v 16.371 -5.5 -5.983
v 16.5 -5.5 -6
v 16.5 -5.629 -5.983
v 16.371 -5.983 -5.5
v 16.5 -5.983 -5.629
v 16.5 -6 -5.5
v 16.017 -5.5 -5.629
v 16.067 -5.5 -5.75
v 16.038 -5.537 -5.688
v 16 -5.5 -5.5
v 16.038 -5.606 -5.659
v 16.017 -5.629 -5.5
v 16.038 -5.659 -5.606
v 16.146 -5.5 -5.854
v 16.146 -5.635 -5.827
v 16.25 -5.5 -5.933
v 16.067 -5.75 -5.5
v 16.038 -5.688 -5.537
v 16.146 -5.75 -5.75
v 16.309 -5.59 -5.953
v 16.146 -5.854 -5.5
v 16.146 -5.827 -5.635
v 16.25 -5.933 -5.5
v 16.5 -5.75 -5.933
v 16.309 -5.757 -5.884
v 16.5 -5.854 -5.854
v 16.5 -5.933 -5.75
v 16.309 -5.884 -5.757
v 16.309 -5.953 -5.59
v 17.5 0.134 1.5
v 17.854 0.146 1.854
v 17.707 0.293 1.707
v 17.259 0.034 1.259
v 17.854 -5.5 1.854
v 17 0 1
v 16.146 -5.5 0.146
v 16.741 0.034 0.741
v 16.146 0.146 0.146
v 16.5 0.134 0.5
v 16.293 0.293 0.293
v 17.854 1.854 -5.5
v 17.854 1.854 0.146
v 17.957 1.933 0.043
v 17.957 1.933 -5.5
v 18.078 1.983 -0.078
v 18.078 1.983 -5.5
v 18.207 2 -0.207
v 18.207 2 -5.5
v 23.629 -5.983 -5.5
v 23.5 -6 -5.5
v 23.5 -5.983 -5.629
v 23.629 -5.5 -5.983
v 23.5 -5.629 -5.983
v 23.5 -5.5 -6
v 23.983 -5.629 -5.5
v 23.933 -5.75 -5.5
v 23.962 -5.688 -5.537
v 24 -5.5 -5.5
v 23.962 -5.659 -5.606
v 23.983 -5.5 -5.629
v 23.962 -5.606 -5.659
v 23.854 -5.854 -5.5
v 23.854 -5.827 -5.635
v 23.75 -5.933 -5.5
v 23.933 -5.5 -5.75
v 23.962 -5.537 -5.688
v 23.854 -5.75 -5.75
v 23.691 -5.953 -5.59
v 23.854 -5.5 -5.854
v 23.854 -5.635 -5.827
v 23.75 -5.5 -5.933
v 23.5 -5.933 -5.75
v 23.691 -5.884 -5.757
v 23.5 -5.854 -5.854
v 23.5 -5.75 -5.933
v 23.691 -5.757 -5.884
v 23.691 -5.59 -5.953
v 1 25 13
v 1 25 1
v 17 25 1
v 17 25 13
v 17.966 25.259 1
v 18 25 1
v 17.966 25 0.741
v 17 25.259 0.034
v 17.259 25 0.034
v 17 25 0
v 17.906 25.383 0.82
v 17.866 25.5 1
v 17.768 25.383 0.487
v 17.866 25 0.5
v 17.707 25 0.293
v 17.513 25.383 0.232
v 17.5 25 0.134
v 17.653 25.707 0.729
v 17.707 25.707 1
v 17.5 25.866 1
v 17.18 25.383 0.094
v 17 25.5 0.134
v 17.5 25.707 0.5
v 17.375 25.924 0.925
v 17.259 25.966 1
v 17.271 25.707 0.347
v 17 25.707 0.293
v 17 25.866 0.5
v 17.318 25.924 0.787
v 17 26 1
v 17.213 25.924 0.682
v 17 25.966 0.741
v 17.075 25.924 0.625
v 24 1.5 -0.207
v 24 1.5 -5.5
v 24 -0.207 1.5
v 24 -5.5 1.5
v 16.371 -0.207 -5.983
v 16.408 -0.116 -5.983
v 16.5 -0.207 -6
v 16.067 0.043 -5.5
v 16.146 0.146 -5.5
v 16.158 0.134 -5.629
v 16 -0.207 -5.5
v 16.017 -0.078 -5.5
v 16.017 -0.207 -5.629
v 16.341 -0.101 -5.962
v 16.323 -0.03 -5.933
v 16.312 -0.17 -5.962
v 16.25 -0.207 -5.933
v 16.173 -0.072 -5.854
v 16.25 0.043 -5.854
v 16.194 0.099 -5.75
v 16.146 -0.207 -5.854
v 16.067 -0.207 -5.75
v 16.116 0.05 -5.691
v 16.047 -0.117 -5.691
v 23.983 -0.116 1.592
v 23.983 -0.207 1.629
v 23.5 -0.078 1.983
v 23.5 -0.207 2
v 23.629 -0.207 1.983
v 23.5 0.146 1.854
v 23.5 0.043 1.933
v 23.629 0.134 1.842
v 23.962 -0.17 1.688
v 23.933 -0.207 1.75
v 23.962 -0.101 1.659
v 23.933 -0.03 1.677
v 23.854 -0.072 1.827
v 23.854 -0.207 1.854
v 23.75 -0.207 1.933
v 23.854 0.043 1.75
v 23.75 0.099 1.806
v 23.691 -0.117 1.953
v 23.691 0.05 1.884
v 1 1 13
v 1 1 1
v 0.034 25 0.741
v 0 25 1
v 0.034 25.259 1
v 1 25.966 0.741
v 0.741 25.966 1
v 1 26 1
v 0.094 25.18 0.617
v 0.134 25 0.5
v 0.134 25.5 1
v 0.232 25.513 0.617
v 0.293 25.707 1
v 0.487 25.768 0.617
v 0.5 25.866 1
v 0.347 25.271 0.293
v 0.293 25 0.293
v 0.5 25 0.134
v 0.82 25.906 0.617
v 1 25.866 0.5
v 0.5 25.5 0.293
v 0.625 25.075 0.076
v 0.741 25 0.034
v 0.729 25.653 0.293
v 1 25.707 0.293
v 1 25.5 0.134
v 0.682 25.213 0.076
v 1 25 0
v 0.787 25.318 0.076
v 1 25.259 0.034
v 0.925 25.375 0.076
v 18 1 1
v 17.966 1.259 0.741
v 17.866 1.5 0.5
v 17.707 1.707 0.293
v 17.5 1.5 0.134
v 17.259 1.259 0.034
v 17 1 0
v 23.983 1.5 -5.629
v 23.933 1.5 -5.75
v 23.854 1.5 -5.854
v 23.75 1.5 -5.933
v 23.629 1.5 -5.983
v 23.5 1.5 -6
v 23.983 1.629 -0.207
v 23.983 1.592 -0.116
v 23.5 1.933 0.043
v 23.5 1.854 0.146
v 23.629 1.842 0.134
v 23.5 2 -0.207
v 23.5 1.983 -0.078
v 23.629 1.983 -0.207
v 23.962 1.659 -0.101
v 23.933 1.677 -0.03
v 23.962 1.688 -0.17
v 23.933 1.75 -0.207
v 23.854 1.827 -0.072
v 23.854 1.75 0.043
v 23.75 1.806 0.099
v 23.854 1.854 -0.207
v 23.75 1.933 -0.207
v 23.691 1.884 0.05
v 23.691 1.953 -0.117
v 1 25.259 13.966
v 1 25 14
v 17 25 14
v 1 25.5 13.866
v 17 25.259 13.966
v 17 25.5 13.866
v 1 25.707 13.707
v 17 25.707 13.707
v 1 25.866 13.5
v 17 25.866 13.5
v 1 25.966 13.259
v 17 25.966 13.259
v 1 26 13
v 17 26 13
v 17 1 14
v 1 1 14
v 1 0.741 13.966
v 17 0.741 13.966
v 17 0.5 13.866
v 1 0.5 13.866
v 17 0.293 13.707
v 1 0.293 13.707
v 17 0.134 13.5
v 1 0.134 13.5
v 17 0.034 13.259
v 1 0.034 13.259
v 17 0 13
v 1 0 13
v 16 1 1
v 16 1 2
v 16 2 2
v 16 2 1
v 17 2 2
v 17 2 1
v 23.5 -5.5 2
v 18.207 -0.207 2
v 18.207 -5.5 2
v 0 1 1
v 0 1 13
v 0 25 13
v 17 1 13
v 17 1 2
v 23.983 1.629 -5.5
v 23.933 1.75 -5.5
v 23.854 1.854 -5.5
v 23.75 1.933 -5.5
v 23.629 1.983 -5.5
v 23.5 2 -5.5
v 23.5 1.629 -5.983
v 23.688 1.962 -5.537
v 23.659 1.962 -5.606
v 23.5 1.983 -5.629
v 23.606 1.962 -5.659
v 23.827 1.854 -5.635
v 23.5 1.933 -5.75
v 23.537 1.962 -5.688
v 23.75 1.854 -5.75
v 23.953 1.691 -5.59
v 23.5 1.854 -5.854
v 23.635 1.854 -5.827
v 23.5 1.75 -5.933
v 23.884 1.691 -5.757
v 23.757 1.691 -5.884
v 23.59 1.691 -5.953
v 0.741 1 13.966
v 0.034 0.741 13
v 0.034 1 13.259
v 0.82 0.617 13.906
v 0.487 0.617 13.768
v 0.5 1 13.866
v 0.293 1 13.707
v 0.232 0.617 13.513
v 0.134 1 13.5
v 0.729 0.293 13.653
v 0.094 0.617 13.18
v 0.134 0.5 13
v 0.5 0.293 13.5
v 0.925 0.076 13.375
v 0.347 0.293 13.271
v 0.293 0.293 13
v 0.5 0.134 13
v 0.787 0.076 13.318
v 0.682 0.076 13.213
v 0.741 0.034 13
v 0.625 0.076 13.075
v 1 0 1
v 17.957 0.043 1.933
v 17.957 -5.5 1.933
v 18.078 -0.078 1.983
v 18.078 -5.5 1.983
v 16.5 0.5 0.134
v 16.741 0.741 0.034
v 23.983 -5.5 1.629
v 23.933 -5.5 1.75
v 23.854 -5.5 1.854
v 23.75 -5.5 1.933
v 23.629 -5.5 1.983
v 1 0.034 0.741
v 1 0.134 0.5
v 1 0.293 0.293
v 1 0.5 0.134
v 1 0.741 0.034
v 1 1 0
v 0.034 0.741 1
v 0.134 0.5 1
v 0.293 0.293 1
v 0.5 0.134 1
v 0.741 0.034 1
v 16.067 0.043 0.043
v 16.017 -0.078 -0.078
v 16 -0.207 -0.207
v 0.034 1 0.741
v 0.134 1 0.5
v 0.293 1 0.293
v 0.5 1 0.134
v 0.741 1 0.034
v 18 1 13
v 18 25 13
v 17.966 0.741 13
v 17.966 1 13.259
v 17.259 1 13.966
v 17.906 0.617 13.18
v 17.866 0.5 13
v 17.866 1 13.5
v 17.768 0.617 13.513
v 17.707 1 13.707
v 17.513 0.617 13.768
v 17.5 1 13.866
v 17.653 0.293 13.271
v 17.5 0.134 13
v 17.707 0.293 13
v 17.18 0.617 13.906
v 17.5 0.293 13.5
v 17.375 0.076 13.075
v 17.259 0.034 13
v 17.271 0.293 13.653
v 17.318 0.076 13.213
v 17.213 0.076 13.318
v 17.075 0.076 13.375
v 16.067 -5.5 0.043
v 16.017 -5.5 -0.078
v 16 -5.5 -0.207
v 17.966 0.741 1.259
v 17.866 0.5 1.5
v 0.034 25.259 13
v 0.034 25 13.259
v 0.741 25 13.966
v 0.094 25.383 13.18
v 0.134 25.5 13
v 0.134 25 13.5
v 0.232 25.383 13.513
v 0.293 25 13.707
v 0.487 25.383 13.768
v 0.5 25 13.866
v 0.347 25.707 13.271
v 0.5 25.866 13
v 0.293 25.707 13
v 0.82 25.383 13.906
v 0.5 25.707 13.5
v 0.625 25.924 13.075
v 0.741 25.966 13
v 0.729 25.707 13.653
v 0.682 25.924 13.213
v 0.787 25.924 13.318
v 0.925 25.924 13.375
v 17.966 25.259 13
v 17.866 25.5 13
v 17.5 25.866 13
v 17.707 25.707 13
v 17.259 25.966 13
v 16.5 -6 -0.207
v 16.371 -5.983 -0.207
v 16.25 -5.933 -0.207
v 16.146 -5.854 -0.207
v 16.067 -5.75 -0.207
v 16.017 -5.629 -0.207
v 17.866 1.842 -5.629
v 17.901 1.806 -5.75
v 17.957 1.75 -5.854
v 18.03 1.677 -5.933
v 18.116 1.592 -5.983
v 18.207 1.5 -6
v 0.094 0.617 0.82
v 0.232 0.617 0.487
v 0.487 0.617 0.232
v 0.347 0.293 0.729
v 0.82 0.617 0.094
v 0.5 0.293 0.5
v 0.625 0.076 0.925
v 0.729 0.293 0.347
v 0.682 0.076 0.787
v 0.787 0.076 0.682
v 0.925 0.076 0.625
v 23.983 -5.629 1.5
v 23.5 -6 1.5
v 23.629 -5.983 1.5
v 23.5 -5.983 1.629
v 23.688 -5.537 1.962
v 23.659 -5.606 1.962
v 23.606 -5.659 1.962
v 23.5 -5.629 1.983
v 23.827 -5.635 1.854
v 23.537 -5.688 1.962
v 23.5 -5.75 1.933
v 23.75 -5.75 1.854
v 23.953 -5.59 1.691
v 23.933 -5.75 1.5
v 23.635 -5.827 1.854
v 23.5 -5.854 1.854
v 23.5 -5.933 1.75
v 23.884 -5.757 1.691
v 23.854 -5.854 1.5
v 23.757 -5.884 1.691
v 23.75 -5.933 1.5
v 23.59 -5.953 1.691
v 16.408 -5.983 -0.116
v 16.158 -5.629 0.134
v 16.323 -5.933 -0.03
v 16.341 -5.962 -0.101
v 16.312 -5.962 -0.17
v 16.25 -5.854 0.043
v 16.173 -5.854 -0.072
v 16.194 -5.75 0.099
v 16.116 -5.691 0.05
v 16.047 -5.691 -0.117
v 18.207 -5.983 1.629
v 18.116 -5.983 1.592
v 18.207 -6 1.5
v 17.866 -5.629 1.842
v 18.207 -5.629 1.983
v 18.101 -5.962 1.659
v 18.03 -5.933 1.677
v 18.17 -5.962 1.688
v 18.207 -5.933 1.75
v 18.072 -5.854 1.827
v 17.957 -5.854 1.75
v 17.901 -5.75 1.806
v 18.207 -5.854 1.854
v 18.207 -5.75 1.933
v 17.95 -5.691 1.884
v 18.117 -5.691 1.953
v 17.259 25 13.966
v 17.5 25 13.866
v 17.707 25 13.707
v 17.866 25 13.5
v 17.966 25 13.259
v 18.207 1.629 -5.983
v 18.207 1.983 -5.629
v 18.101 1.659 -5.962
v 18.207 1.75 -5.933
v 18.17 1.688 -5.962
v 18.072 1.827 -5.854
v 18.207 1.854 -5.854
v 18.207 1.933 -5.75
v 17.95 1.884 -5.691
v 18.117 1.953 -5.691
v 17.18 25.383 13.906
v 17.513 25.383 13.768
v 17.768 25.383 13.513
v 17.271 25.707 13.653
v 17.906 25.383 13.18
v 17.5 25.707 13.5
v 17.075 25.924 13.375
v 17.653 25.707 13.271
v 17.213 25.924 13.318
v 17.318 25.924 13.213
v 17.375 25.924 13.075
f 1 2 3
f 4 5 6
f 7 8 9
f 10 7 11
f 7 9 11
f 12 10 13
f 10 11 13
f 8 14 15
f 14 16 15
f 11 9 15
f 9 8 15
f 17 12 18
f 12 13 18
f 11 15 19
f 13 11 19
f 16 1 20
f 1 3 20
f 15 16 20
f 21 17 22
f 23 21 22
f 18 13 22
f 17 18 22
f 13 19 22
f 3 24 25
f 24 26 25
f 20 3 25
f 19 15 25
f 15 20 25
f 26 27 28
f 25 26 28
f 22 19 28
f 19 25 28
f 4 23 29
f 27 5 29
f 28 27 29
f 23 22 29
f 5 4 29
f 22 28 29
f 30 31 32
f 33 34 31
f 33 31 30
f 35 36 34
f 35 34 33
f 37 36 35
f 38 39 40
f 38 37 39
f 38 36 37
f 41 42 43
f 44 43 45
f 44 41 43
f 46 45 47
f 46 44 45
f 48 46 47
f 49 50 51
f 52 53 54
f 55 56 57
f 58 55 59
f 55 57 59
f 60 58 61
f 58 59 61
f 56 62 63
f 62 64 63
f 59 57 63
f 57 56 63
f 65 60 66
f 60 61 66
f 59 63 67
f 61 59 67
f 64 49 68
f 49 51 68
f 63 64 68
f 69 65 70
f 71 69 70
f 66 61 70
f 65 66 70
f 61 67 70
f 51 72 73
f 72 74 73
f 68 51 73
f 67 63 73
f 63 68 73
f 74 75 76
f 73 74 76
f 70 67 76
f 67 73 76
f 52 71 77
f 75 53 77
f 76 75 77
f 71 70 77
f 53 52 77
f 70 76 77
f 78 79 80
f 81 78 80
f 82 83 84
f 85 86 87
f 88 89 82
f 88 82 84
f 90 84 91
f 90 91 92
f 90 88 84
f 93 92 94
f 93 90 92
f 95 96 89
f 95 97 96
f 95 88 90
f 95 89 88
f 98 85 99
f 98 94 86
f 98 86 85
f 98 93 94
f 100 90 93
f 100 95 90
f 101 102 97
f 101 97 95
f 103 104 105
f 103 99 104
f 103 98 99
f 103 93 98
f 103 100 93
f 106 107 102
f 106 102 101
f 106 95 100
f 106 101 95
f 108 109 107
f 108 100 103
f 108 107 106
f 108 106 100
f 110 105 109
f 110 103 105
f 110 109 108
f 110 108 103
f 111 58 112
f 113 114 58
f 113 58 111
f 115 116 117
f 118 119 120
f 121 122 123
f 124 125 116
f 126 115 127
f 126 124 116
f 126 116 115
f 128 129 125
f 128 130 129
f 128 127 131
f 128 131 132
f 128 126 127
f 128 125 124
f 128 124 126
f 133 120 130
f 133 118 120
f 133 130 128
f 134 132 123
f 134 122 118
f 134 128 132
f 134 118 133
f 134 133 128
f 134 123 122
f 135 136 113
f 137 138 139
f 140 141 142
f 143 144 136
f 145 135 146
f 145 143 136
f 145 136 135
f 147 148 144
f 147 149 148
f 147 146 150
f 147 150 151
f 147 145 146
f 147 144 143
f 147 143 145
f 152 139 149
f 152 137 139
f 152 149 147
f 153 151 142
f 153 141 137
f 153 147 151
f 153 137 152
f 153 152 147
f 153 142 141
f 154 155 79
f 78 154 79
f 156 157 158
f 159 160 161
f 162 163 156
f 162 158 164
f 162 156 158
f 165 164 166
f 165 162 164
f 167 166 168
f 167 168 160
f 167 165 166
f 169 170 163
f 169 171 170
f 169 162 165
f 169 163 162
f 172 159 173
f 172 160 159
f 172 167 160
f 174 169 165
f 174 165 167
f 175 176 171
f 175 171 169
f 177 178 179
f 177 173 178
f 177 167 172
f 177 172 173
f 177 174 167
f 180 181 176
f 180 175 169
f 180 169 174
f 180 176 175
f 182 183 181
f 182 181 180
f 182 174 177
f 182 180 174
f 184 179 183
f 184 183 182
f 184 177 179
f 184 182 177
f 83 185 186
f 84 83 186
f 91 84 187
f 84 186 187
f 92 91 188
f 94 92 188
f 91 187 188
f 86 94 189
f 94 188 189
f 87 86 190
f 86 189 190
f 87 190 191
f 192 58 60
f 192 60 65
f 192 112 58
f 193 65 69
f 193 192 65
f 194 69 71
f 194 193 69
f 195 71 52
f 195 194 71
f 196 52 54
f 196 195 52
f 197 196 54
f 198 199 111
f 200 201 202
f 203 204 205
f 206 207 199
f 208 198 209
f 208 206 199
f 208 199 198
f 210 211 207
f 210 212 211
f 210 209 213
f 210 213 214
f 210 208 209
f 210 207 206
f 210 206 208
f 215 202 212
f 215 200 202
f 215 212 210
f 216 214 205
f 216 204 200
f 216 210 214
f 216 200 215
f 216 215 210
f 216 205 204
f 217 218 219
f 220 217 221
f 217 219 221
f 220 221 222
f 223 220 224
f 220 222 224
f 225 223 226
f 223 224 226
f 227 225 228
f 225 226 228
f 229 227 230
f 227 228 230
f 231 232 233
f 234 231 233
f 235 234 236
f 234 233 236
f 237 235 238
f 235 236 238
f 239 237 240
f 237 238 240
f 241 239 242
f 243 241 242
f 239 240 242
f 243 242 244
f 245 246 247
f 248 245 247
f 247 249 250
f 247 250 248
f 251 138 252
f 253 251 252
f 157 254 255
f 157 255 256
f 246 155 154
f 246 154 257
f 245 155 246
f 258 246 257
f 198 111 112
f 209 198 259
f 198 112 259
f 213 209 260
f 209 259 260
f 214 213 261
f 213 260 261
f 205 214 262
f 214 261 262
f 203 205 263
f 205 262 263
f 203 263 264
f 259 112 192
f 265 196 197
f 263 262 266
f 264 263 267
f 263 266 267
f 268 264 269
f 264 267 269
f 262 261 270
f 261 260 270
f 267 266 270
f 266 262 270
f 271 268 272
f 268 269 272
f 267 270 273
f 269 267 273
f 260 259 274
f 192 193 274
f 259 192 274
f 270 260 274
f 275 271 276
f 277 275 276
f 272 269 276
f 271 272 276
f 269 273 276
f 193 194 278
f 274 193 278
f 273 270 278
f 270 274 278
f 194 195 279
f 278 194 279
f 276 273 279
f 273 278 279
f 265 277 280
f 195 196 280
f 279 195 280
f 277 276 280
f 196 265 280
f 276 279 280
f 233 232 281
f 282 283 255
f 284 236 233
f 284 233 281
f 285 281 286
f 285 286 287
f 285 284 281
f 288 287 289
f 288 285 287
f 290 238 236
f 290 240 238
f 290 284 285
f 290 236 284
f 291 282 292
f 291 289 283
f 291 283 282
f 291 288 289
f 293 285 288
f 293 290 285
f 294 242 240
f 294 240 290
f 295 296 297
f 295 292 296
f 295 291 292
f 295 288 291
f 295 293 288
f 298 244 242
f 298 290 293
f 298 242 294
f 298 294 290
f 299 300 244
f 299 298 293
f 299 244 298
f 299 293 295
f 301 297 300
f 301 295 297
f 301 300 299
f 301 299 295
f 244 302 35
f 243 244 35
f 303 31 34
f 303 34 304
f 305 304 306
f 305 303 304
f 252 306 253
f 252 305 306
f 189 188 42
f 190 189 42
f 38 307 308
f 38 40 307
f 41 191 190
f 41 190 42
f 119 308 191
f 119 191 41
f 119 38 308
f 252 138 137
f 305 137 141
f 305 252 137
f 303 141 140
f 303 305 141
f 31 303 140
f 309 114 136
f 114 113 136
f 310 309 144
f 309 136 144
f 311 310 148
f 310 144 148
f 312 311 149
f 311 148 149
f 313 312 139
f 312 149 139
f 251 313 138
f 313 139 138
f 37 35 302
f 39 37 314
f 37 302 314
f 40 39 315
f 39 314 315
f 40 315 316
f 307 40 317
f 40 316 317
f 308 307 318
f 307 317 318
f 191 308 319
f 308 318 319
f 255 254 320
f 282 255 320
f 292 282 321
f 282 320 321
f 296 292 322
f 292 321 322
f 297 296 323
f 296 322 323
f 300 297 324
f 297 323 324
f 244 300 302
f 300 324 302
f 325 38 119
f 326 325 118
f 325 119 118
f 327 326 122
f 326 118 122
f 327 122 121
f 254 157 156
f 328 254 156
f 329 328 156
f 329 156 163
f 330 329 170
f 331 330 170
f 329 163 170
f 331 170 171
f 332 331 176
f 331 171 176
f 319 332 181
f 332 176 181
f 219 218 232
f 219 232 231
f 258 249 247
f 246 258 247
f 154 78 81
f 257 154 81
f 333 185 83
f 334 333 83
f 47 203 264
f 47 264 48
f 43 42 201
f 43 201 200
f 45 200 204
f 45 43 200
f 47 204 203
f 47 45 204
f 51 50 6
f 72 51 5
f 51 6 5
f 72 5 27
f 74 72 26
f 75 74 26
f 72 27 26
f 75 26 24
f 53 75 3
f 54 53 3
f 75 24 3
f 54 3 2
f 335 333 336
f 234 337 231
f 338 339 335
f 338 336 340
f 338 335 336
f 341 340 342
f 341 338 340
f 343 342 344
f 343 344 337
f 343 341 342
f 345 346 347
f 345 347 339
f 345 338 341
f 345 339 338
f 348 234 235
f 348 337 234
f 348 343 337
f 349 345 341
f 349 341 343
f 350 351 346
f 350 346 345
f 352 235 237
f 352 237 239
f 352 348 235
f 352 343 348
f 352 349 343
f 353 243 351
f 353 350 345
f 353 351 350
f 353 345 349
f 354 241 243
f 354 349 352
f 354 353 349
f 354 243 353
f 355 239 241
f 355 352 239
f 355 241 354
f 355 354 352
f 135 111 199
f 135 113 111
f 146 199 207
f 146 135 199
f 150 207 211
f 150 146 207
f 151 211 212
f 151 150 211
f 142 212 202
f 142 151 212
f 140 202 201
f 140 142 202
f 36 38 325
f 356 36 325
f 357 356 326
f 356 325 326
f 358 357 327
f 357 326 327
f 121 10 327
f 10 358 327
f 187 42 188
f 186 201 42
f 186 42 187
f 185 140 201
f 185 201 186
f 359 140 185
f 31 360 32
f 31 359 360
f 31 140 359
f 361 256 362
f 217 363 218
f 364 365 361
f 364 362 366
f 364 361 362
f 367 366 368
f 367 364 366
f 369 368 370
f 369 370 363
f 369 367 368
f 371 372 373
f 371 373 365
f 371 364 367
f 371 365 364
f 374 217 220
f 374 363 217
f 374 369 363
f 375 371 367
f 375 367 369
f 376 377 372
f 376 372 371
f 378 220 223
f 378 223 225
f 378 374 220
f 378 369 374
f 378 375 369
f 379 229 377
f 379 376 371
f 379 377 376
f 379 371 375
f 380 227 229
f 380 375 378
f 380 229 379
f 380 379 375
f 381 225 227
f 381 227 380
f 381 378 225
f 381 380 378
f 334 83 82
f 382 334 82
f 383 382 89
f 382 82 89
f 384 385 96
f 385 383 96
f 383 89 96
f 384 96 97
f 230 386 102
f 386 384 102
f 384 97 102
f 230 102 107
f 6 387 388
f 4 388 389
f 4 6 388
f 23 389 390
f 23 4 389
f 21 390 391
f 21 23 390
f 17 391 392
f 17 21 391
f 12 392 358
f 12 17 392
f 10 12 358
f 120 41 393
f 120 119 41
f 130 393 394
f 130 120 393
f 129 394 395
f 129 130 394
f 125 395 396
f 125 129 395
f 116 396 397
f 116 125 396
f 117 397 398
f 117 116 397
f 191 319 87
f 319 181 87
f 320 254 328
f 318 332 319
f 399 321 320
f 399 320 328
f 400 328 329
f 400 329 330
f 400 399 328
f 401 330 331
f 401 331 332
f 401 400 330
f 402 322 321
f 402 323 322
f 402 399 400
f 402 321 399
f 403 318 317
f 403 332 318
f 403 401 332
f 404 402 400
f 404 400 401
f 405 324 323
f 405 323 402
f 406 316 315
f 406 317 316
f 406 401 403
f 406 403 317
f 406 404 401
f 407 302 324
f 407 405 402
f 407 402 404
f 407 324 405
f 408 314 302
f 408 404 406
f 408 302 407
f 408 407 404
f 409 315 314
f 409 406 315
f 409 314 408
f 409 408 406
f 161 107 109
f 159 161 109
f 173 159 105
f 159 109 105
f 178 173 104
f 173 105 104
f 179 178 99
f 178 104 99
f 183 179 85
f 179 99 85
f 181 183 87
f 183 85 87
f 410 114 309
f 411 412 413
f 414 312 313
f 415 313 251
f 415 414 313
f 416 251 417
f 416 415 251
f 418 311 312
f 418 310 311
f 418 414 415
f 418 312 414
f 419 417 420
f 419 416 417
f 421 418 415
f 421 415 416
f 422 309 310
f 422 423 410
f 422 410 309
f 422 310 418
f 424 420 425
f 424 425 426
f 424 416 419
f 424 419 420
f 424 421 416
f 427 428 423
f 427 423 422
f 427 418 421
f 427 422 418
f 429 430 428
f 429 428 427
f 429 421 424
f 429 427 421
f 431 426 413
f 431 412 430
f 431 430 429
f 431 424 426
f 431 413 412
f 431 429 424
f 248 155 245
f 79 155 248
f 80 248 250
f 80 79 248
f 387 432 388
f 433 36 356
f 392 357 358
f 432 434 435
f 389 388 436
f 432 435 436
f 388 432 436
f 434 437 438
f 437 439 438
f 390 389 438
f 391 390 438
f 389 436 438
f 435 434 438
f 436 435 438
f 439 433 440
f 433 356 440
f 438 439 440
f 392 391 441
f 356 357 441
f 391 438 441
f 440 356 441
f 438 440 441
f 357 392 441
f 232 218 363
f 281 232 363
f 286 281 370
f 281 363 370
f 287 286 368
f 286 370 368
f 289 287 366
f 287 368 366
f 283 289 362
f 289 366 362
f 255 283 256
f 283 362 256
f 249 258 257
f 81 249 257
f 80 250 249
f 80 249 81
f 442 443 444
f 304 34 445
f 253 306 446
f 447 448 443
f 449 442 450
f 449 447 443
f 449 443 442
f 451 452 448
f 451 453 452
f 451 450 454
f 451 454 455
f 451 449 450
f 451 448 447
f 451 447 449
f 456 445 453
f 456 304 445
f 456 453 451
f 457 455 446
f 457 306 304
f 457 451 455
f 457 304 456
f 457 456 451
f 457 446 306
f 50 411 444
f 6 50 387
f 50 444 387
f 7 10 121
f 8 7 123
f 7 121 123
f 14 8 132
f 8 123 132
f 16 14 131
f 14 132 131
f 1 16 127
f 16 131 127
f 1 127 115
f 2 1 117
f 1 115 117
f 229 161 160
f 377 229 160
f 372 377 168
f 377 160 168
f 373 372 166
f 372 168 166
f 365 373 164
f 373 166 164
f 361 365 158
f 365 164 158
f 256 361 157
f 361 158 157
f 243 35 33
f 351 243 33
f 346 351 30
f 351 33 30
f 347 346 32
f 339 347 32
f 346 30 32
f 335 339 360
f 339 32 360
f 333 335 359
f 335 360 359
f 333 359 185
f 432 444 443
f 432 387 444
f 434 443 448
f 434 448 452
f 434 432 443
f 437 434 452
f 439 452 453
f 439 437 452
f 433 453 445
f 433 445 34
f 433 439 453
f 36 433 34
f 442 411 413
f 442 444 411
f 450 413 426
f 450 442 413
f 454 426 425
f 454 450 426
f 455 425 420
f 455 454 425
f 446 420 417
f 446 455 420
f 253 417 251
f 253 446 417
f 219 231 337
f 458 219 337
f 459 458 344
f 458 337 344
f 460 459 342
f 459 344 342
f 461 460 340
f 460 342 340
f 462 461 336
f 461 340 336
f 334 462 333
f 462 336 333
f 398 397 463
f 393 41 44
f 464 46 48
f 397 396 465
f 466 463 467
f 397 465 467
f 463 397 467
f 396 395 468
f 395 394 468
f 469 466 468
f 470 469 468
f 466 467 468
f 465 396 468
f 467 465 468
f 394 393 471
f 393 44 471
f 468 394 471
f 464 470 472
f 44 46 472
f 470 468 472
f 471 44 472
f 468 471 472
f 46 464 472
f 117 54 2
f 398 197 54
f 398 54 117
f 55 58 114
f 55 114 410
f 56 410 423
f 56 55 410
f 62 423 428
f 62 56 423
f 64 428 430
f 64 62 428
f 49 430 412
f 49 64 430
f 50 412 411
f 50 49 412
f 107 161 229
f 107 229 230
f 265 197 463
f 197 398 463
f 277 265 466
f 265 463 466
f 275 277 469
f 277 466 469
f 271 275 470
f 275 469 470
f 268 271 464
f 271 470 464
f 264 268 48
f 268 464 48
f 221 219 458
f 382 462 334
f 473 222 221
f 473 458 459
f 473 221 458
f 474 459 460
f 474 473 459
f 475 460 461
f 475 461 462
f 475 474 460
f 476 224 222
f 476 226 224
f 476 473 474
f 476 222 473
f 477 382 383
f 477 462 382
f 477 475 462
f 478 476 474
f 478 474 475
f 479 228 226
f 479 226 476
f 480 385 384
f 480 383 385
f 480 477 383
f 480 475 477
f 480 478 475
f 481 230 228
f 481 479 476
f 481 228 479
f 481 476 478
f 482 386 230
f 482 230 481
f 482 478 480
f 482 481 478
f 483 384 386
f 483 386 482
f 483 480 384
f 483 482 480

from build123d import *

# Parameters (mm, degrees)
SKETCH1_W                = 18
SKETCH1_H                = 26
BOSS_EXTRUDE1_DEPTH      = 14
SHELL1_T                 = 1
BOSS_EXTRUDE3_DEPTH      = 6
BOSS_EXTRUDE3_DEPTH_BACK = 2
SKETCH2_W                = 8
SKETCH2_H                = 8
CHAMFER2_SIZE            = 2
FILLET1_R                = 1
FILLET2_R                = 0.5


with BuildPart() as part:
    # Sketch1 → Boss-Extrude1 (new body)
    with BuildSketch(Plane.XY):
        with Locations((9, 13)):
            Rectangle(SKETCH1_W, SKETCH1_H)
    extrude(amount=BOSS_EXTRUDE1_DEPTH)

    # Shell1 (no face opened: a closed hollow body)
    add(offset(amount=-SHELL1_T, mode=Mode.PRIVATE), mode=Mode.SUBTRACT)

    # Sketch2 → Boss-Extrude3 (add, two sides: drawn at the far end of the back side and taken through both)
    with BuildSketch(Plane(origin=(0, 0, 0), x_dir=(-1, 0, 0), z_dir=(0, 0, -1)).offset(-BOSS_EXTRUDE3_DEPTH_BACK)):
        with Locations((-20, -2)):
            Rectangle(SKETCH2_W, SKETCH2_H)
    extrude(amount=BOSS_EXTRUDE3_DEPTH + BOSS_EXTRUDE3_DEPTH_BACK)

    # Chamfer2
    chamfer2_edges = [part.edges().sort_by_distance(p)[0] for p in [
        (16, -3, 2),
        (16, 2, -3),
        (21, 2, 2),
    ]]
    chamfer(chamfer2_edges, length=CHAMFER2_SIZE)

    # Fillet1
    # the kernel refuses this fillet: 1 mm, written as the material it takes off along each edge
    with BuildSketch(Plane(origin=(1, 25, 1), x_dir=(0, 1, 0), z_dir=(0, 0, -1))) as fillet1_piece_1_section:
        Polygon((0, 0), (FILLET1_R, 0), (FILLET1_R, -FILLET1_R), (0, -FILLET1_R), align=None)
    fillet1_piece_1 = extrude(amount=FILLET1_R, mode=Mode.PRIVATE)
    fillet1_piece_1 = fillet1_piece_1 - Plane(origin=(1, 25, 1), x_dir=(0.7071067811865475, -0.7071067811865477, 0), z_dir=(0, 0, -1)) * Sphere(FILLET1_R, mode=Mode.PRIVATE)
    add(fillet1_piece_1, mode=Mode.SUBTRACT)
    with BuildSketch(Plane(origin=(1, 1, 1), x_dir=(0, 0, -1), z_dir=(0, -1, 0))) as fillet1_piece_2_section:
        Polygon((0, 0), (FILLET1_R, 0), (FILLET1_R, -FILLET1_R), (0, -FILLET1_R), align=None)
    fillet1_piece_2 = extrude(amount=FILLET1_R, mode=Mode.PRIVATE)
    fillet1_piece_2 = fillet1_piece_2 - Plane(origin=(1, 1, 1), x_dir=(0.7071067811865475, 0, 0.7071067811865475), z_dir=(0, -1, 0)) * Sphere(FILLET1_R, mode=Mode.PRIVATE)
    add(fillet1_piece_2, mode=Mode.SUBTRACT)
    with BuildSketch(Plane(origin=(17, 25, 1), x_dir=(0, 0, -1), z_dir=(0, 1, 0))) as fillet1_piece_3_section:
        Polygon((0, 0), (FILLET1_R, 0), (FILLET1_R, -FILLET1_R), (0, -FILLET1_R), align=None)
    fillet1_piece_3 = extrude(amount=FILLET1_R, mode=Mode.PRIVATE)
    fillet1_piece_3 = fillet1_piece_3 - Plane(origin=(17, 25, 1), x_dir=(-0.7071067811865475, 0, 0.7071067811865475), z_dir=(0, 1, 0)) * Sphere(FILLET1_R, mode=Mode.PRIVATE)
    add(fillet1_piece_3, mode=Mode.SUBTRACT)
    with BuildSketch(Plane(origin=(1, 1, 13), x_dir=(-1, 0, 0), z_dir=(0, -1, 0))) as fillet1_piece_4_section:
        Polygon((0, 0), (FILLET1_R, 0), (FILLET1_R, -FILLET1_R), (0, -FILLET1_R), align=None)
    fillet1_piece_4 = extrude(amount=FILLET1_R, mode=Mode.PRIVATE)
    fillet1_piece_4 = fillet1_piece_4 - Plane(origin=(1, 1, 13), x_dir=(0.7071067811865475, 0, -0.7071067811865475), z_dir=(0, -1, 0)) * Sphere(FILLET1_R, mode=Mode.PRIVATE)
    add(fillet1_piece_4, mode=Mode.SUBTRACT)
    with BuildSketch(Plane(origin=(17, 1, 13), x_dir=(1, 0, 0), z_dir=(0, -1, 0))) as fillet1_piece_5_section:
        Polygon((0, 0), (FILLET1_R, 0), (FILLET1_R, FILLET1_R), (0, FILLET1_R), align=None)
    fillet1_piece_5 = extrude(amount=FILLET1_R, mode=Mode.PRIVATE)
    fillet1_piece_5 = fillet1_piece_5 - Plane(origin=(17, 1, 13), x_dir=(-0.7071067811865475, 0, -0.7071067811865475), z_dir=(0, -1, 0)) * Sphere(FILLET1_R, mode=Mode.PRIVATE)
    add(fillet1_piece_5, mode=Mode.SUBTRACT)
    with BuildSketch(Plane(origin=(17, 25, 13), x_dir=(1, 0, 0), z_dir=(0, 1, 0))) as fillet1_piece_6_section:
        Polygon((0, 0), (FILLET1_R, 0), (FILLET1_R, -FILLET1_R), (0, -FILLET1_R), align=None)
    fillet1_piece_6 = extrude(amount=FILLET1_R, mode=Mode.PRIVATE)
    fillet1_piece_6 = fillet1_piece_6 - Plane(origin=(17, 25, 13), x_dir=(-0.7071067811865475, 0, -0.7071067811865475), z_dir=(0, 1, 0)) * Sphere(FILLET1_R, mode=Mode.PRIVATE)
    add(fillet1_piece_6, mode=Mode.SUBTRACT)
    with BuildSketch(Plane(origin=(1, 25, 13), x_dir=(-1, 0, 0), z_dir=(0, 1, 0))) as fillet1_piece_7_section:
        Polygon((0, 0), (FILLET1_R, 0), (FILLET1_R, FILLET1_R), (0, FILLET1_R), align=None)
    fillet1_piece_7 = extrude(amount=FILLET1_R, mode=Mode.PRIVATE)
    fillet1_piece_7 = fillet1_piece_7 - Plane(origin=(1, 25, 13), x_dir=(0.7071067811865475, 0, -0.7071067811865475), z_dir=(0, 1, 0)) * Sphere(FILLET1_R, mode=Mode.PRIVATE)
    add(fillet1_piece_7, mode=Mode.SUBTRACT)
    with BuildSketch(Plane(origin=(0, 25, 0), x_dir=(1, 0, 0), z_dir=(0, -1, 0)), Plane(origin=(18, 1, 14), x_dir=(0, 0, -1), z_dir=(0, 1, 0)), Plane(origin=(0, 25, 14), x_dir=(0, 0, -1), z_dir=(0, -1, 0))) as fillet1_piece_8:
        with BuildLine():
            CenterArc((FILLET1_R, FILLET1_R), FILLET1_R, 180, 90)
            Line((0, FILLET1_R), (0, 0))
            Line((0, 0), (FILLET1_R, 0))
        make_face()
    extrude(amount=24, mode=Mode.SUBTRACT)
    with BuildSketch(Plane(origin=(1, 0, 0), x_dir=(0, 0, 1), z_dir=(1, 0, 0))) as fillet1_piece_9_section:
        with BuildLine():
            CenterArc((FILLET1_R, -FILLET1_R), FILLET1_R, 90, 90)
            Line((0, -FILLET1_R), (0, 0))
            Line((0, 0), (FILLET1_R, 0))
        make_face()
    fillet1_piece_9 = extrude(amount=17.5, mode=Mode.PRIVATE)
    fillet1_piece_9 = split(fillet1_piece_9, bisect_by=Plane(origin=(12.381861728, 0.226424858, -3.618138272), z_dir=(-0.7071067811865476, 0, 0.7071067811865476)), keep=Keep.TOP, mode=Mode.PRIVATE)
    fillet1_piece_9 = split(fillet1_piece_9, bisect_by=Plane(origin=(12.381861728, -3.618138272, 0.226424858), z_dir=(-0.7071067811865476, 0.7071067811865476, 0)), keep=Keep.TOP, mode=Mode.PRIVATE)
    add(fillet1_piece_9, mode=Mode.SUBTRACT)
    with BuildSketch(Plane(origin=(1, 0, 0), x_dir=(0, 0, 1), z_dir=(1, 0, 0))) as fillet1_piece_10_section:
        with BuildLine():
            CenterArc((FILLET1_R, -FILLET1_R), FILLET1_R, 90, 90)
            Line((0, -FILLET1_R), (0, 0))
            Line((0, 0), (FILLET1_R, 0))
        make_face()
    fillet1_piece_10 = extrude(amount=17.5, mode=Mode.PRIVATE)
    fillet1_piece_10 = split(fillet1_piece_10, bisect_by=Plane(origin=(16.16446835, 0.528927527, 0.16446835), z_dir=(0.7071067811865476, 0, -0.7071067811865476)), keep=Keep.TOP, mode=Mode.PRIVATE)
    fillet1_piece_10 = split(fillet1_piece_10, bisect_by=Plane(origin=(16.407441135, 0.407441135, 0.042981958), z_dir=(-0.7071067811865476, 0.7071067811865476, 0)), keep=Keep.TOP, mode=Mode.PRIVATE)
    add(fillet1_piece_10, mode=Mode.SUBTRACT)
    with BuildSketch(Plane(origin=(1, 0, 0), x_dir=(0, 0, 1), z_dir=(1, 0, 0))) as fillet1_piece_11_section:
        with BuildLine():
            CenterArc((FILLET1_R, -FILLET1_R), FILLET1_R, 90, 90)
            Line((0, -FILLET1_R), (0, 0))
            Line((0, 0), (FILLET1_R, 0))
        make_face()
    fillet1_piece_11 = extrude(amount=17.5, mode=Mode.PRIVATE)
    fillet1_piece_11 = split(fillet1_piece_11, bisect_by=Plane(origin=(16.407441135, 0.042981958, 0.407441135), z_dir=(-0.7071067811865476, 0, 0.7071067811865476)), keep=Keep.TOP, mode=Mode.PRIVATE)
    fillet1_piece_11 = split(fillet1_piece_11, bisect_by=Plane(origin=(16.16446835, 0.16446835, 0.528927527), z_dir=(0.7071067811865476, -0.7071067811865476, 0)), keep=Keep.TOP, mode=Mode.PRIVATE)
    add(fillet1_piece_11, mode=Mode.SUBTRACT)
    with BuildSketch(Plane(origin=(18, -0.5, 0), x_dir=(-1, 0, 0), z_dir=(0, 1, 0))) as fillet1_piece_12_section:
        with BuildLine():
            CenterArc((FILLET1_R, FILLET1_R), FILLET1_R, 180, 90)
            Line((0, FILLET1_R), (0, 0))
            Line((0, 0), (FILLET1_R, 0))
        make_face()
    fillet1_piece_12 = extrude(amount=25.5, mode=Mode.PRIVATE)
    fillet1_piece_12 = split(fillet1_piece_12, bisect_by=Plane(origin=(17.83553165, 1.83553165, 0.528927527), z_dir=(0.7071067811865476, -0.7071067811865476, 0)), keep=Keep.TOP, mode=Mode.PRIVATE)
    fillet1_piece_12 = split(fillet1_piece_12, bisect_by=Plane(origin=(17.957018042, 1.592558865, 0.407441135), z_dir=(0, 0.7071067811865476, 0.7071067811865476)), keep=Keep.TOP, mode=Mode.PRIVATE)
    add(fillet1_piece_12, mode=Mode.SUBTRACT)
    with BuildSketch(Plane(origin=(18, -0.5, 0), x_dir=(-1, 0, 0), z_dir=(0, 1, 0))) as fillet1_piece_13_section:
        with BuildLine():
            CenterArc((FILLET1_R, FILLET1_R), FILLET1_R, 180, 90)
            Line((0, FILLET1_R), (0, 0))
            Line((0, 0), (FILLET1_R, 0))
        make_face()
    fillet1_piece_13 = extrude(amount=25.5, mode=Mode.PRIVATE)
    fillet1_piece_13 = split(fillet1_piece_13, bisect_by=Plane(origin=(17.592558865, 1.592558865, 0.042981958), z_dir=(-0.7071067811865476, 0.7071067811865476, 0)), keep=Keep.TOP, mode=Mode.PRIVATE)
    fillet1_piece_13 = split(fillet1_piece_13, bisect_by=Plane(origin=(17.471072473, 1.83553165, 0.16446835), z_dir=(0, -0.7071067811865476, -0.7071067811865476)), keep=Keep.TOP, mode=Mode.PRIVATE)
    add(fillet1_piece_13, mode=Mode.SUBTRACT)
    with BuildSketch(Plane(origin=(18, -0.5, 0), x_dir=(-1, 0, 0), z_dir=(0, 1, 0))) as fillet1_piece_14_section:
        with BuildLine():
            CenterArc((FILLET1_R, FILLET1_R), FILLET1_R, 180, 90)
            Line((0, FILLET1_R), (0, 0))
            Line((0, 0), (FILLET1_R, 0))
        make_face()
    fillet1_piece_14 = extrude(amount=25.5, mode=Mode.PRIVATE)
    fillet1_piece_14 = split(fillet1_piece_14, bisect_by=Plane(origin=(23.618173362, 7.618173362, 0.226414546), z_dir=(-0.7071067811865476, 0.7071067811865476, 0)), keep=Keep.TOP, mode=Mode.PRIVATE)
    fillet1_piece_14 = split(fillet1_piece_14, bisect_by=Plane(origin=(17.773585454, 7.618173362, -5.618173362), z_dir=(0, 0.7071067811865476, 0.7071067811865476)), keep=Keep.TOP, mode=Mode.PRIVATE)
    add(fillet1_piece_14, mode=Mode.SUBTRACT)
    with BuildSketch(Plane(origin=(17, 26, 0), x_dir=(0, -1, 0), z_dir=(-1, 0, 0)), Plane(origin=(1, 0, 14), x_dir=(0, 0, -1), z_dir=(1, 0, 0))) as fillet1_piece_15:
        with BuildLine():
            CenterArc((FILLET1_R, FILLET1_R), FILLET1_R, 180, 90)
            Line((0, FILLET1_R), (0, 0))
            Line((0, 0), (FILLET1_R, 0))
        make_face()
    extrude(amount=16, mode=Mode.SUBTRACT)
    with BuildSketch(Plane(origin=(17, 26, 14), x_dir=(0, -1, 0), z_dir=(-1, 0, 0))) as fillet1_piece_16:
        with BuildLine():
            CenterArc((FILLET1_R, -FILLET1_R), FILLET1_R, 90, 90)
            Line((0, -FILLET1_R), (0, 0))
            Line((0, 0), (FILLET1_R, 0))
        make_face()
    extrude(amount=16, mode=Mode.SUBTRACT)
    with BuildSketch(Plane(origin=(0, 26, 1), x_dir=(0, -1, 0), z_dir=(0, 0, 1)), Plane(origin=(0, 0, 1), x_dir=(1, 0, 0), z_dir=(0, 0, 1))) as fillet1_piece_17:
        with BuildLine():
            CenterArc((FILLET1_R, FILLET1_R), FILLET1_R, 180, 90)
            Line((0, FILLET1_R), (0, 0))
            Line((0, 0), (FILLET1_R, 0))
        make_face()
    extrude(amount=12, mode=Mode.SUBTRACT)
    with BuildSketch(Plane(origin=(18, 26, 1), x_dir=(0, -1, 0), z_dir=(0, 0, 1))) as fillet1_piece_18:
        with BuildLine():
            CenterArc((FILLET1_R, -FILLET1_R), FILLET1_R, 90, 90)
            Line((0, -FILLET1_R), (0, 0))
            Line((0, 0), (FILLET1_R, 0))
        make_face()
    extrude(amount=12, mode=Mode.SUBTRACT)
    with BuildSketch(Plane(origin=(18, 0, -0.5), x_dir=(-1, 0, 0), z_dir=(0, 0, 1))) as fillet1_piece_19_section:
        with BuildLine():
            CenterArc((FILLET1_R, -FILLET1_R), FILLET1_R, 90, 90)
            Line((0, -FILLET1_R), (0, 0))
            Line((0, 0), (FILLET1_R, 0))
        make_face()
    fillet1_piece_19 = extrude(amount=13.5, mode=Mode.PRIVATE)
    fillet1_piece_19 = split(fillet1_piece_19, bisect_by=Plane(origin=(17.83553165, 0.528927527, 1.83553165), z_dir=(0.7071067811865476, 0, -0.7071067811865476)), keep=Keep.TOP, mode=Mode.PRIVATE)
    fillet1_piece_19 = split(fillet1_piece_19, bisect_by=Plane(origin=(17.957018042, 0.407441135, 1.592558865), z_dir=(0, 0.7071067811865476, 0.7071067811865476)), keep=Keep.TOP, mode=Mode.PRIVATE)
    add(fillet1_piece_19, mode=Mode.SUBTRACT)
    with BuildSketch(Plane(origin=(18, 0, -0.5), x_dir=(-1, 0, 0), z_dir=(0, 0, 1))) as fillet1_piece_20_section:
        with BuildLine():
            CenterArc((FILLET1_R, -FILLET1_R), FILLET1_R, 90, 90)
            Line((0, -FILLET1_R), (0, 0))
            Line((0, 0), (FILLET1_R, 0))
        make_face()
    fillet1_piece_20 = extrude(amount=13.5, mode=Mode.PRIVATE)
    fillet1_piece_20 = split(fillet1_piece_20, bisect_by=Plane(origin=(17.592558865, 0.042981958, 1.592558865), z_dir=(-0.7071067811865476, 0, 0.7071067811865476)), keep=Keep.TOP, mode=Mode.PRIVATE)
    fillet1_piece_20 = split(fillet1_piece_20, bisect_by=Plane(origin=(17.471072473, 0.16446835, 1.83553165), z_dir=(0, -0.7071067811865476, -0.7071067811865476)), keep=Keep.TOP, mode=Mode.PRIVATE)
    add(fillet1_piece_20, mode=Mode.SUBTRACT)
    with BuildSketch(Plane(origin=(18, 0, -0.5), x_dir=(-1, 0, 0), z_dir=(0, 0, 1))) as fillet1_piece_21_section:
        with BuildLine():
            CenterArc((FILLET1_R, -FILLET1_R), FILLET1_R, 90, 90)
            Line((0, -FILLET1_R), (0, 0))
            Line((0, 0), (FILLET1_R, 0))
        make_face()
    fillet1_piece_21 = extrude(amount=13.5, mode=Mode.PRIVATE)
    fillet1_piece_21 = split(fillet1_piece_21, bisect_by=Plane(origin=(20.618101716, 0.226435602, 4.618101716), z_dir=(-0.7071067811865476, 0, 0.7071067811865476)), keep=Keep.TOP, mode=Mode.PRIVATE)
    fillet1_piece_21 = split(fillet1_piece_21, bisect_by=Plane(origin=(17.773564398, -2.618101716, 4.618101716), z_dir=(0, 0.7071067811865476, 0.7071067811865476)), keep=Keep.TOP, mode=Mode.PRIVATE)
    add(fillet1_piece_21, mode=Mode.SUBTRACT)

    # Fillet2
    fillet2_edges = [part.edges().sort_by_distance(p)[0] for p in [
        (20, -6, -6),
        (24, -6, -2),
        (24, -2, -6),
        (24, 2, -3),
        (21, 2, -6),
        (18, 2, -3),
        (21, 2, 0),
        (24, -3, 2),
        (24, 1, 1),
        (21, -6, 2),
        (18, -3, 2),
        (21, 0, 2),
        (16, -3, -6),
        (16, -6, -3),
        (16, -3, 0),
        (16, 0, -3),
        (17, 1, -6),
        (17, -6, 1),
    ]]
    fillet(fillet2_edges, radius=FILLET2_R)


solid = part.part
